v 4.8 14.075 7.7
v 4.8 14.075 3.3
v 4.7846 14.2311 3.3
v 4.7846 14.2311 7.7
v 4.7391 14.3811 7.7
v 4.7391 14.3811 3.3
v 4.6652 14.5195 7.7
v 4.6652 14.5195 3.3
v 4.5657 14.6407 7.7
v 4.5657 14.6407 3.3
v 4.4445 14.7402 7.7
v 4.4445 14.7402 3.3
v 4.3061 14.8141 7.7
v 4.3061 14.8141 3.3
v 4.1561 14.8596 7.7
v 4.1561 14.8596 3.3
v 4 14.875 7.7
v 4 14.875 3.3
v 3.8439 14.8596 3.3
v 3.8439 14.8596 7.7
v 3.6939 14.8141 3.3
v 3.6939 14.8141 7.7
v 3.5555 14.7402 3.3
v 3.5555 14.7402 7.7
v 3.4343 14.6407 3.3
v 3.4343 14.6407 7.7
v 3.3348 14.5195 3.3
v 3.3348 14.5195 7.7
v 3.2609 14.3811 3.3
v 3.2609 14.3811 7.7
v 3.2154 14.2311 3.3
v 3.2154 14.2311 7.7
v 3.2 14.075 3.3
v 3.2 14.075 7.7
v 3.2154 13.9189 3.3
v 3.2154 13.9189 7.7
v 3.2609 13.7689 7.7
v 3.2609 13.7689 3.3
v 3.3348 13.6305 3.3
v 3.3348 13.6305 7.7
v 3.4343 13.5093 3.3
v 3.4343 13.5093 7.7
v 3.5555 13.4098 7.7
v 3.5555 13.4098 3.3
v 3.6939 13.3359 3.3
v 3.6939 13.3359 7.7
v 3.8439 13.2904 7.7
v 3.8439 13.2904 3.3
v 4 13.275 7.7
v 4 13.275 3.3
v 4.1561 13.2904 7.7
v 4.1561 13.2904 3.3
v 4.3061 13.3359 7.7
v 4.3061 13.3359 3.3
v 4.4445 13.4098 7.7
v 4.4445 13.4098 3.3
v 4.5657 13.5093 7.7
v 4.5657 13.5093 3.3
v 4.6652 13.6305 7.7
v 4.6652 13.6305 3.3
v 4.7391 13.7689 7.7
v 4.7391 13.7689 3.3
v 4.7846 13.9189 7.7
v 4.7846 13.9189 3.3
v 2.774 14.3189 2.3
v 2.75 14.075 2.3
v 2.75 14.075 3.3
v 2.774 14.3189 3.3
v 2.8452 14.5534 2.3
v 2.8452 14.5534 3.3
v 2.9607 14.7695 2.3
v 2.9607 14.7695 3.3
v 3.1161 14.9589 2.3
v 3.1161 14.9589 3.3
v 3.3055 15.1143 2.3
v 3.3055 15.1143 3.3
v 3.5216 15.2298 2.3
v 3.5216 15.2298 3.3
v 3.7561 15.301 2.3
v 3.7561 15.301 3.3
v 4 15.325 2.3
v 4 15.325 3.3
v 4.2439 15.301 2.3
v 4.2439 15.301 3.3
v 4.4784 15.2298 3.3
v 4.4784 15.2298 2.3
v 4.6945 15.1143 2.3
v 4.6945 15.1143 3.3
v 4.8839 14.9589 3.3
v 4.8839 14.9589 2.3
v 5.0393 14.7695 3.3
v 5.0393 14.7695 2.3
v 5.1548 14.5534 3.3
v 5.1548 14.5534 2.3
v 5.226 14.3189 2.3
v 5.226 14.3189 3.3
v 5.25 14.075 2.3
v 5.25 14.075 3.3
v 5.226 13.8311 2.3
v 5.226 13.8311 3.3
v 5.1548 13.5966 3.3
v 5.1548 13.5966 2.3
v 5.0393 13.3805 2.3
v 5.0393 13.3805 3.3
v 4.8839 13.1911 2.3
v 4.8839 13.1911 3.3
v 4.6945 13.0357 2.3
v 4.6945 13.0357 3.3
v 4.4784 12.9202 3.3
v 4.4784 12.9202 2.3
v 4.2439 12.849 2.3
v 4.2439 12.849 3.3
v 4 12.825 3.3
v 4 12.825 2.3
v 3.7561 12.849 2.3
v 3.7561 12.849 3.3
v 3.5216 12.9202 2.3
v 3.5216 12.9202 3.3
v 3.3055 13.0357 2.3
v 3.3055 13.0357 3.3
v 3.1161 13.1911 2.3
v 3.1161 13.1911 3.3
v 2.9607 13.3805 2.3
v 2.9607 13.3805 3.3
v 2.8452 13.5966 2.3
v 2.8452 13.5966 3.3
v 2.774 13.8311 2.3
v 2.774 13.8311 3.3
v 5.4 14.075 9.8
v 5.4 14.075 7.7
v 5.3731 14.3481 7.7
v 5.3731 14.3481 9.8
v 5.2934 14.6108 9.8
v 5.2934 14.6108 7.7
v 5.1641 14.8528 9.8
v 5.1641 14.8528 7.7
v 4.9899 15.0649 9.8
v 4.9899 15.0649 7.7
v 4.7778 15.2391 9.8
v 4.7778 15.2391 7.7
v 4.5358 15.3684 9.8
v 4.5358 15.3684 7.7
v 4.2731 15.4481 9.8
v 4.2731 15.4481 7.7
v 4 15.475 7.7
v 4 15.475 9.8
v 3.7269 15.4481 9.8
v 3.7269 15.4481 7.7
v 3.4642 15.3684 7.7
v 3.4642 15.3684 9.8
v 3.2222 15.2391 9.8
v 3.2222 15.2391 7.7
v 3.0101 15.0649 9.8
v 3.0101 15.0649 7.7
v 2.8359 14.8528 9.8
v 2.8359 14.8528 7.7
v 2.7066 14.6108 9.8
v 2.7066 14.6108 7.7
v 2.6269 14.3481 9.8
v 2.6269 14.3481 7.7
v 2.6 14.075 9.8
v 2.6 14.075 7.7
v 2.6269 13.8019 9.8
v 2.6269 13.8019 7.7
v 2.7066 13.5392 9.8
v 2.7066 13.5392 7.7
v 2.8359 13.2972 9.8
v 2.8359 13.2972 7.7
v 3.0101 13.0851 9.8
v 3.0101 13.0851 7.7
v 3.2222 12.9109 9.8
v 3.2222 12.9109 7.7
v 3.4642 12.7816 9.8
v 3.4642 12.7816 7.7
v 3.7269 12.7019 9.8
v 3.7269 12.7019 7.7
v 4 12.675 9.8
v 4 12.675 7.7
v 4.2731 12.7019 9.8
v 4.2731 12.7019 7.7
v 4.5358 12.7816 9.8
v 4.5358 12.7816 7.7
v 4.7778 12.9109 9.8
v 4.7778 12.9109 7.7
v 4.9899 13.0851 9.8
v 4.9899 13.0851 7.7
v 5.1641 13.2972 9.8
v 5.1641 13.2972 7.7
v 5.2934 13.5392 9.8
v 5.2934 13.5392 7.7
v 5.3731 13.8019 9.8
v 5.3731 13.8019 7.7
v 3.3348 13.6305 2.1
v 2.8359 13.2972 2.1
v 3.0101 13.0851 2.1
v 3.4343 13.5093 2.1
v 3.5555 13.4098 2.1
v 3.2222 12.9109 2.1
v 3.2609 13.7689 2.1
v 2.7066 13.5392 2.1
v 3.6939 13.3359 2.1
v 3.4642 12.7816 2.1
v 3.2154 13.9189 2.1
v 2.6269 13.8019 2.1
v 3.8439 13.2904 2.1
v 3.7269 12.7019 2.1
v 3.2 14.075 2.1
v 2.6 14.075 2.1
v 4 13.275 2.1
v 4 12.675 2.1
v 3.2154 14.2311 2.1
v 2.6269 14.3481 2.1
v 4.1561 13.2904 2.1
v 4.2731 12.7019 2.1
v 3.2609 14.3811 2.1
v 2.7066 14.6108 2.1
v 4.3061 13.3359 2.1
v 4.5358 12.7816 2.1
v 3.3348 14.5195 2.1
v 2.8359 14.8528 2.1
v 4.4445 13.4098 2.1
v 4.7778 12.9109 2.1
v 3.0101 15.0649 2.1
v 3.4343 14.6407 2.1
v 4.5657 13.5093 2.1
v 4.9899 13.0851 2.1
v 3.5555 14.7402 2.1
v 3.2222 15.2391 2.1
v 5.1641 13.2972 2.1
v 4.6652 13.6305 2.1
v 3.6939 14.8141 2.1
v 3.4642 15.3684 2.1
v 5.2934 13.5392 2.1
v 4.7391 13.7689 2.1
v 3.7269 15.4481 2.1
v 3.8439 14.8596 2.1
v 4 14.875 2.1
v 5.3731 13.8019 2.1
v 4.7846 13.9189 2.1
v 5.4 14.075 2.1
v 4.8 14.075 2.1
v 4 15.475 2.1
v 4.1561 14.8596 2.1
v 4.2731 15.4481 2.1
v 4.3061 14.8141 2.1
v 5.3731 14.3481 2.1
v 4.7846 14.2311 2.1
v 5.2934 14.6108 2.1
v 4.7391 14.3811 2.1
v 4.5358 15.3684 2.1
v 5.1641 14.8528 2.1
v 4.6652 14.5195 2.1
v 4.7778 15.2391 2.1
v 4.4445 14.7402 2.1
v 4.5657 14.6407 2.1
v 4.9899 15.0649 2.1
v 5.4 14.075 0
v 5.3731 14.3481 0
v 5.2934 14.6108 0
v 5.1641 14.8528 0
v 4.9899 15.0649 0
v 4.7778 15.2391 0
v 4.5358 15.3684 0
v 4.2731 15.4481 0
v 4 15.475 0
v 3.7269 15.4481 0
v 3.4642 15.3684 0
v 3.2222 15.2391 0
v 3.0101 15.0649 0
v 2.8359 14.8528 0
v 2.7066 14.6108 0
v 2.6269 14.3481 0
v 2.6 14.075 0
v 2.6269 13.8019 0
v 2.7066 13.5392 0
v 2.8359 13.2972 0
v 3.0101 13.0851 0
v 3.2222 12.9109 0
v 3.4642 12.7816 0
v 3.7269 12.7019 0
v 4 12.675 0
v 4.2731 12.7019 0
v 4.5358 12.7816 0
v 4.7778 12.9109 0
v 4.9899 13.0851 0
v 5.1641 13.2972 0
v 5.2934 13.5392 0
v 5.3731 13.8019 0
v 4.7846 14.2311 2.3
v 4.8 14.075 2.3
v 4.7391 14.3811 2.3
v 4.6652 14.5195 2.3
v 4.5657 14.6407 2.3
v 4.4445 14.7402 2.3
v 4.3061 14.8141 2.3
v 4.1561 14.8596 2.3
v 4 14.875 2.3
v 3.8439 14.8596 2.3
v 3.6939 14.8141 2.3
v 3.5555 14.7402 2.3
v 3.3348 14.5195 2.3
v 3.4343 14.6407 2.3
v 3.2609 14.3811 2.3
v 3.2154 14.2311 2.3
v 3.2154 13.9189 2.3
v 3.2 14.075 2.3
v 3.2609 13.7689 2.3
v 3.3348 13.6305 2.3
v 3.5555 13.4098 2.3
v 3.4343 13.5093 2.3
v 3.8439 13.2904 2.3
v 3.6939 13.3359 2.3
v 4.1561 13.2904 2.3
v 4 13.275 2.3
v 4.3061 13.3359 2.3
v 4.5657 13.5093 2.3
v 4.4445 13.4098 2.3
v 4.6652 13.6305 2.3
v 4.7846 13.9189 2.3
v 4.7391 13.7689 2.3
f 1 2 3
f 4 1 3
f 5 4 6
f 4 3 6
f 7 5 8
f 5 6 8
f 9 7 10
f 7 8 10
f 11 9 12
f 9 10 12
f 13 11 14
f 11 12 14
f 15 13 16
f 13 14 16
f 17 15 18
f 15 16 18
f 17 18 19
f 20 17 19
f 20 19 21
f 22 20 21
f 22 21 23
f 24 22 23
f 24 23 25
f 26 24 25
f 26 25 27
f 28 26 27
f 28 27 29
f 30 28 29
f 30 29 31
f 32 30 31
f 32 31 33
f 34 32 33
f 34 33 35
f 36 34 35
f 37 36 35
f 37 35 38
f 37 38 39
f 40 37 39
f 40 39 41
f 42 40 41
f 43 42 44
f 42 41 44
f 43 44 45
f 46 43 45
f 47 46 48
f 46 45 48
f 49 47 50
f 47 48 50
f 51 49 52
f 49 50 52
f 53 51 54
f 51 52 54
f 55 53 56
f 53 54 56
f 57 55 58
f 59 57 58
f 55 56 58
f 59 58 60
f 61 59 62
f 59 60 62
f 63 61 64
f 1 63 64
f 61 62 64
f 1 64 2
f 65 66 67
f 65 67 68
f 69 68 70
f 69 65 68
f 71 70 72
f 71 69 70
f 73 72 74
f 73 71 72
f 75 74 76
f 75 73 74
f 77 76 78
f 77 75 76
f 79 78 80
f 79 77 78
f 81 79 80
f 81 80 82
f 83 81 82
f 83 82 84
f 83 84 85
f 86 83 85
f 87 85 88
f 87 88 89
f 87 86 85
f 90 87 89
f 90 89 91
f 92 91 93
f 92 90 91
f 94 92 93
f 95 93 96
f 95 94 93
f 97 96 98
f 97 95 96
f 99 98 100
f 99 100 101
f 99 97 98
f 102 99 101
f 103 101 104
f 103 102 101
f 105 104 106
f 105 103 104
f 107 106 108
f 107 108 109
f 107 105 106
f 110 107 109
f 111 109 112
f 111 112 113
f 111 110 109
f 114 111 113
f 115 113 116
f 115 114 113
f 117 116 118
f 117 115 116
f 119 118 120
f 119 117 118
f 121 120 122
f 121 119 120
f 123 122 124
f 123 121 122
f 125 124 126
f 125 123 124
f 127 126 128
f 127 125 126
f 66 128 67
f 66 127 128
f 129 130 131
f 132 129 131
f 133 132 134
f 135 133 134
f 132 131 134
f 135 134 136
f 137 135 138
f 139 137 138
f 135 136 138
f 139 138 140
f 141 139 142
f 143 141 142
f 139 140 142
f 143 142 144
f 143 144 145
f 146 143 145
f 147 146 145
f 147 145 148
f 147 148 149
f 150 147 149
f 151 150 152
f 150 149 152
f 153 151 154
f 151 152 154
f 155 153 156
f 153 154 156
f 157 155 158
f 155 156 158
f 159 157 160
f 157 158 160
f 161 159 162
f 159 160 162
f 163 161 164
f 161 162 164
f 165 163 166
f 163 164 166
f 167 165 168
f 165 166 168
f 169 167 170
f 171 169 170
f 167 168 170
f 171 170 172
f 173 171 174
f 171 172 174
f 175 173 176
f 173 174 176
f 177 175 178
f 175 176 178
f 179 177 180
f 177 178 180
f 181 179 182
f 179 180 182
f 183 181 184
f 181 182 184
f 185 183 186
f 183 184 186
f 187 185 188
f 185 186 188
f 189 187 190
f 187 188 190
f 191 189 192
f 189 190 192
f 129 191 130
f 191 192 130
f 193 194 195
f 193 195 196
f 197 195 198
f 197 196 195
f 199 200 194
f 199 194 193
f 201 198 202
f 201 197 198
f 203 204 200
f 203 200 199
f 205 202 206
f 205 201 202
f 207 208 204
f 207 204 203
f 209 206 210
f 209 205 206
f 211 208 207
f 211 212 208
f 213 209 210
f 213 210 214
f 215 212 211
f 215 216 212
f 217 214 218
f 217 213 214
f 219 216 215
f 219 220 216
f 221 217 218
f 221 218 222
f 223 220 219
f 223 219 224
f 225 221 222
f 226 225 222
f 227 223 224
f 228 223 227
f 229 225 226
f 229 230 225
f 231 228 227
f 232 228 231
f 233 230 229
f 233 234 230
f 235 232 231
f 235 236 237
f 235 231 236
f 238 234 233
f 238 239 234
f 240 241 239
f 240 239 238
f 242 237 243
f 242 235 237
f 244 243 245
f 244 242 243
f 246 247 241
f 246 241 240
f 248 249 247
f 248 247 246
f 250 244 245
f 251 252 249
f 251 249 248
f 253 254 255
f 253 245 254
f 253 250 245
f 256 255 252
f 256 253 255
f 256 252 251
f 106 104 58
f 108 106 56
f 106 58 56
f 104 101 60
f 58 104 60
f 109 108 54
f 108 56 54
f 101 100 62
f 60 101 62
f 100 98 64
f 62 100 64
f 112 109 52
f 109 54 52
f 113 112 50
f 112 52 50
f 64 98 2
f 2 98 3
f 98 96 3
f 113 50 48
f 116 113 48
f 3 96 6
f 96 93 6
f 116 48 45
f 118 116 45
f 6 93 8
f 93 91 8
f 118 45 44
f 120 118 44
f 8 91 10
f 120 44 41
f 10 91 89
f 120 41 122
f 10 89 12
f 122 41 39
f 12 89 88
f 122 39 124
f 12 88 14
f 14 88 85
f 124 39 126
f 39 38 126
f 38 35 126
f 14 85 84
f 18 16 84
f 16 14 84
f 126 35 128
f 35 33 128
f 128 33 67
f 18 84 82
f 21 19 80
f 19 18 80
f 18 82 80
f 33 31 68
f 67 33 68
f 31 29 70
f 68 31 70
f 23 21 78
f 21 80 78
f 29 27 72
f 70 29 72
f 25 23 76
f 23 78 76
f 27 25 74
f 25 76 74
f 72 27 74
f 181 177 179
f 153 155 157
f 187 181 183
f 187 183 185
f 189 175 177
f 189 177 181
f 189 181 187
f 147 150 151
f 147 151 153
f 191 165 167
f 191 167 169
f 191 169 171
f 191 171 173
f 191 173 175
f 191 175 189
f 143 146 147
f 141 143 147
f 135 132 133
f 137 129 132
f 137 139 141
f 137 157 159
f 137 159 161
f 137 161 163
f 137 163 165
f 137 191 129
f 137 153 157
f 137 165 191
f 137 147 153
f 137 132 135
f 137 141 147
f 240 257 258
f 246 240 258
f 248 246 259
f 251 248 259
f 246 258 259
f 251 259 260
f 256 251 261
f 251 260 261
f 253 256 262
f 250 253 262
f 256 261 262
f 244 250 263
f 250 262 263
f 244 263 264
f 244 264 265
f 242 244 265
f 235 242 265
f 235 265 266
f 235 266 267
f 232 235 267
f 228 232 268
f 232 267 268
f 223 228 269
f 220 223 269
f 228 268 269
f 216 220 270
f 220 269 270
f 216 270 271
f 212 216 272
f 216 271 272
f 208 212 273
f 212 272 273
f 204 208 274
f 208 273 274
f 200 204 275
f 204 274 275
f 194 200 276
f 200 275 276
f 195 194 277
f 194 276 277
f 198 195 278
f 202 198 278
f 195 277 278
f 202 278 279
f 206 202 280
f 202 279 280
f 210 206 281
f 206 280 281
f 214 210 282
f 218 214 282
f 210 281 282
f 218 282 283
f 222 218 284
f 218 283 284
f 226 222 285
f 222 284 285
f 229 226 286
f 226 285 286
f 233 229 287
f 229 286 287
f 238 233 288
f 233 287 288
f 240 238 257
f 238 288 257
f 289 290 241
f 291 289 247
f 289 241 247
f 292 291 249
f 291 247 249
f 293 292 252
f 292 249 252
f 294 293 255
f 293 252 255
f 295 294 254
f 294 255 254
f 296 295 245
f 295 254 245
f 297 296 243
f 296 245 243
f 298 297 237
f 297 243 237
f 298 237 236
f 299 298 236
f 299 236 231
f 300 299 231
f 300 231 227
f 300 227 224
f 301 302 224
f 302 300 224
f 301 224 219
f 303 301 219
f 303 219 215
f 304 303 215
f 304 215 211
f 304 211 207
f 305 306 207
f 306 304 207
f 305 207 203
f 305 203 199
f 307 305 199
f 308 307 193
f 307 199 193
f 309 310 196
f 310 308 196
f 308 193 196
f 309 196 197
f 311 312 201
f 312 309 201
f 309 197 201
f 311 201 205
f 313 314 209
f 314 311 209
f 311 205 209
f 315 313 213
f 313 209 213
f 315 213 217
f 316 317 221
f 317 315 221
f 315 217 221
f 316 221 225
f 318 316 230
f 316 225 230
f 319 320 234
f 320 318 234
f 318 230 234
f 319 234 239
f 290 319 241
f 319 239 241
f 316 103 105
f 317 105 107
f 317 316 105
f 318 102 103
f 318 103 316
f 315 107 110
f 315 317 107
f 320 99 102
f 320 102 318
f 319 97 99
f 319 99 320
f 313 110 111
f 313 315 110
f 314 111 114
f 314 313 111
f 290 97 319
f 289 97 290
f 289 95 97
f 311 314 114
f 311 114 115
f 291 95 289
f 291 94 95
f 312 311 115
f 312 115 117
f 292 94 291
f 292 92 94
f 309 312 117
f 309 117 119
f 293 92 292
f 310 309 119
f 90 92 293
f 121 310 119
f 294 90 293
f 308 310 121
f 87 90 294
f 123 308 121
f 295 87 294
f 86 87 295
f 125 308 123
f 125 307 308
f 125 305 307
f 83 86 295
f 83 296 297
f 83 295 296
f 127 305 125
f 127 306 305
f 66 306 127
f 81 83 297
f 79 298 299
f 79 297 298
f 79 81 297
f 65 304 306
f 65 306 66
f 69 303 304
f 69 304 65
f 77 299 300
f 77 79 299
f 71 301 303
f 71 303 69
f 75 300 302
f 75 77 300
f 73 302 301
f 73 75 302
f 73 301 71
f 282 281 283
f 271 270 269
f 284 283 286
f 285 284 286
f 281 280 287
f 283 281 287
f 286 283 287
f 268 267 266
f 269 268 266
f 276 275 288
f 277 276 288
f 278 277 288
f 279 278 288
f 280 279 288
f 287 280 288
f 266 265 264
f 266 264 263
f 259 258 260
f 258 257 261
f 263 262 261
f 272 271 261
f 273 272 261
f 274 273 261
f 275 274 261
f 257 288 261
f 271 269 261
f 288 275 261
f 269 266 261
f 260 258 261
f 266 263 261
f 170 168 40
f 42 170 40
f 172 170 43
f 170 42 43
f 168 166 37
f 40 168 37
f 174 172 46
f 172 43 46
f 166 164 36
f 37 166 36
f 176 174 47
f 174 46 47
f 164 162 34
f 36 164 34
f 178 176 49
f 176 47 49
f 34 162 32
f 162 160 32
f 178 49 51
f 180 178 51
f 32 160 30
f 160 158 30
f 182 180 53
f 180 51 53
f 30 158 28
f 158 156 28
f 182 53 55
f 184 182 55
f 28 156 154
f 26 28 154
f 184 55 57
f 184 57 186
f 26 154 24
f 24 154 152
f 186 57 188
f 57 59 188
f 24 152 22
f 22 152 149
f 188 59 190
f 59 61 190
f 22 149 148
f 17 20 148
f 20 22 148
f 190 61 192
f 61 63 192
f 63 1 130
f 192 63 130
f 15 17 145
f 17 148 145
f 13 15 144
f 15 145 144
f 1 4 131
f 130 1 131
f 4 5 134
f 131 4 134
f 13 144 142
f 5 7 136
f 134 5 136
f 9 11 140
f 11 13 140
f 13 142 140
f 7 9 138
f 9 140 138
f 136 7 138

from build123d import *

# Parameters (mm, degrees)
ESQUISSE1_R        = 1.4
BOSS_EXTRU_1_DEPTH = 2.1
ESQUISSE2_R        = 0.8
BOSS_EXTRU_2_DEPTH = 5.6
ESQUISSE3_R        = 1.4
BOSS_EXTRU_3_DEPTH = 2.1
BOSS_EXTRU_4_START = -2.3
ESQUISSE4_R        = 1.25
BOSS_EXTRU_4_DEPTH = 1


with BuildPart() as part:
    # Esquisse1 → Boss.-Extru.1 (new body)
    with BuildSketch(Plane.XY):
        with Locations((4, 14.075)):
            Circle(ESQUISSE1_R)
    extrude(amount=BOSS_EXTRU_1_DEPTH)

    # Esquisse2 → Boss.-Extru.2 (add)
    with BuildSketch(Plane.XY.offset(2.1)):
        with Locations((4, 14.075)):
            Circle(ESQUISSE2_R)
    extrude(amount=BOSS_EXTRU_2_DEPTH)

    # Esquisse3 → Boss.-Extru.3 (add)
    with BuildSketch(Plane.XY.offset(7.7)):
        with Locations((4, 14.075)):
            Circle(ESQUISSE3_R)
    extrude(amount=BOSS_EXTRU_3_DEPTH)

    # Esquisse4 → Boss.-Extru.4 (add)
    with BuildSketch(Plane(origin=(0, 0, 0), x_dir=(-1, 0, 0), z_dir=(0, 0, -1)).offset(BOSS_EXTRU_4_START)):
        with Locations((-4, 14.075)):
            Circle(ESQUISSE4_R)
    extrude(amount=-BOSS_EXTRU_4_DEPTH)


solid = part.part
